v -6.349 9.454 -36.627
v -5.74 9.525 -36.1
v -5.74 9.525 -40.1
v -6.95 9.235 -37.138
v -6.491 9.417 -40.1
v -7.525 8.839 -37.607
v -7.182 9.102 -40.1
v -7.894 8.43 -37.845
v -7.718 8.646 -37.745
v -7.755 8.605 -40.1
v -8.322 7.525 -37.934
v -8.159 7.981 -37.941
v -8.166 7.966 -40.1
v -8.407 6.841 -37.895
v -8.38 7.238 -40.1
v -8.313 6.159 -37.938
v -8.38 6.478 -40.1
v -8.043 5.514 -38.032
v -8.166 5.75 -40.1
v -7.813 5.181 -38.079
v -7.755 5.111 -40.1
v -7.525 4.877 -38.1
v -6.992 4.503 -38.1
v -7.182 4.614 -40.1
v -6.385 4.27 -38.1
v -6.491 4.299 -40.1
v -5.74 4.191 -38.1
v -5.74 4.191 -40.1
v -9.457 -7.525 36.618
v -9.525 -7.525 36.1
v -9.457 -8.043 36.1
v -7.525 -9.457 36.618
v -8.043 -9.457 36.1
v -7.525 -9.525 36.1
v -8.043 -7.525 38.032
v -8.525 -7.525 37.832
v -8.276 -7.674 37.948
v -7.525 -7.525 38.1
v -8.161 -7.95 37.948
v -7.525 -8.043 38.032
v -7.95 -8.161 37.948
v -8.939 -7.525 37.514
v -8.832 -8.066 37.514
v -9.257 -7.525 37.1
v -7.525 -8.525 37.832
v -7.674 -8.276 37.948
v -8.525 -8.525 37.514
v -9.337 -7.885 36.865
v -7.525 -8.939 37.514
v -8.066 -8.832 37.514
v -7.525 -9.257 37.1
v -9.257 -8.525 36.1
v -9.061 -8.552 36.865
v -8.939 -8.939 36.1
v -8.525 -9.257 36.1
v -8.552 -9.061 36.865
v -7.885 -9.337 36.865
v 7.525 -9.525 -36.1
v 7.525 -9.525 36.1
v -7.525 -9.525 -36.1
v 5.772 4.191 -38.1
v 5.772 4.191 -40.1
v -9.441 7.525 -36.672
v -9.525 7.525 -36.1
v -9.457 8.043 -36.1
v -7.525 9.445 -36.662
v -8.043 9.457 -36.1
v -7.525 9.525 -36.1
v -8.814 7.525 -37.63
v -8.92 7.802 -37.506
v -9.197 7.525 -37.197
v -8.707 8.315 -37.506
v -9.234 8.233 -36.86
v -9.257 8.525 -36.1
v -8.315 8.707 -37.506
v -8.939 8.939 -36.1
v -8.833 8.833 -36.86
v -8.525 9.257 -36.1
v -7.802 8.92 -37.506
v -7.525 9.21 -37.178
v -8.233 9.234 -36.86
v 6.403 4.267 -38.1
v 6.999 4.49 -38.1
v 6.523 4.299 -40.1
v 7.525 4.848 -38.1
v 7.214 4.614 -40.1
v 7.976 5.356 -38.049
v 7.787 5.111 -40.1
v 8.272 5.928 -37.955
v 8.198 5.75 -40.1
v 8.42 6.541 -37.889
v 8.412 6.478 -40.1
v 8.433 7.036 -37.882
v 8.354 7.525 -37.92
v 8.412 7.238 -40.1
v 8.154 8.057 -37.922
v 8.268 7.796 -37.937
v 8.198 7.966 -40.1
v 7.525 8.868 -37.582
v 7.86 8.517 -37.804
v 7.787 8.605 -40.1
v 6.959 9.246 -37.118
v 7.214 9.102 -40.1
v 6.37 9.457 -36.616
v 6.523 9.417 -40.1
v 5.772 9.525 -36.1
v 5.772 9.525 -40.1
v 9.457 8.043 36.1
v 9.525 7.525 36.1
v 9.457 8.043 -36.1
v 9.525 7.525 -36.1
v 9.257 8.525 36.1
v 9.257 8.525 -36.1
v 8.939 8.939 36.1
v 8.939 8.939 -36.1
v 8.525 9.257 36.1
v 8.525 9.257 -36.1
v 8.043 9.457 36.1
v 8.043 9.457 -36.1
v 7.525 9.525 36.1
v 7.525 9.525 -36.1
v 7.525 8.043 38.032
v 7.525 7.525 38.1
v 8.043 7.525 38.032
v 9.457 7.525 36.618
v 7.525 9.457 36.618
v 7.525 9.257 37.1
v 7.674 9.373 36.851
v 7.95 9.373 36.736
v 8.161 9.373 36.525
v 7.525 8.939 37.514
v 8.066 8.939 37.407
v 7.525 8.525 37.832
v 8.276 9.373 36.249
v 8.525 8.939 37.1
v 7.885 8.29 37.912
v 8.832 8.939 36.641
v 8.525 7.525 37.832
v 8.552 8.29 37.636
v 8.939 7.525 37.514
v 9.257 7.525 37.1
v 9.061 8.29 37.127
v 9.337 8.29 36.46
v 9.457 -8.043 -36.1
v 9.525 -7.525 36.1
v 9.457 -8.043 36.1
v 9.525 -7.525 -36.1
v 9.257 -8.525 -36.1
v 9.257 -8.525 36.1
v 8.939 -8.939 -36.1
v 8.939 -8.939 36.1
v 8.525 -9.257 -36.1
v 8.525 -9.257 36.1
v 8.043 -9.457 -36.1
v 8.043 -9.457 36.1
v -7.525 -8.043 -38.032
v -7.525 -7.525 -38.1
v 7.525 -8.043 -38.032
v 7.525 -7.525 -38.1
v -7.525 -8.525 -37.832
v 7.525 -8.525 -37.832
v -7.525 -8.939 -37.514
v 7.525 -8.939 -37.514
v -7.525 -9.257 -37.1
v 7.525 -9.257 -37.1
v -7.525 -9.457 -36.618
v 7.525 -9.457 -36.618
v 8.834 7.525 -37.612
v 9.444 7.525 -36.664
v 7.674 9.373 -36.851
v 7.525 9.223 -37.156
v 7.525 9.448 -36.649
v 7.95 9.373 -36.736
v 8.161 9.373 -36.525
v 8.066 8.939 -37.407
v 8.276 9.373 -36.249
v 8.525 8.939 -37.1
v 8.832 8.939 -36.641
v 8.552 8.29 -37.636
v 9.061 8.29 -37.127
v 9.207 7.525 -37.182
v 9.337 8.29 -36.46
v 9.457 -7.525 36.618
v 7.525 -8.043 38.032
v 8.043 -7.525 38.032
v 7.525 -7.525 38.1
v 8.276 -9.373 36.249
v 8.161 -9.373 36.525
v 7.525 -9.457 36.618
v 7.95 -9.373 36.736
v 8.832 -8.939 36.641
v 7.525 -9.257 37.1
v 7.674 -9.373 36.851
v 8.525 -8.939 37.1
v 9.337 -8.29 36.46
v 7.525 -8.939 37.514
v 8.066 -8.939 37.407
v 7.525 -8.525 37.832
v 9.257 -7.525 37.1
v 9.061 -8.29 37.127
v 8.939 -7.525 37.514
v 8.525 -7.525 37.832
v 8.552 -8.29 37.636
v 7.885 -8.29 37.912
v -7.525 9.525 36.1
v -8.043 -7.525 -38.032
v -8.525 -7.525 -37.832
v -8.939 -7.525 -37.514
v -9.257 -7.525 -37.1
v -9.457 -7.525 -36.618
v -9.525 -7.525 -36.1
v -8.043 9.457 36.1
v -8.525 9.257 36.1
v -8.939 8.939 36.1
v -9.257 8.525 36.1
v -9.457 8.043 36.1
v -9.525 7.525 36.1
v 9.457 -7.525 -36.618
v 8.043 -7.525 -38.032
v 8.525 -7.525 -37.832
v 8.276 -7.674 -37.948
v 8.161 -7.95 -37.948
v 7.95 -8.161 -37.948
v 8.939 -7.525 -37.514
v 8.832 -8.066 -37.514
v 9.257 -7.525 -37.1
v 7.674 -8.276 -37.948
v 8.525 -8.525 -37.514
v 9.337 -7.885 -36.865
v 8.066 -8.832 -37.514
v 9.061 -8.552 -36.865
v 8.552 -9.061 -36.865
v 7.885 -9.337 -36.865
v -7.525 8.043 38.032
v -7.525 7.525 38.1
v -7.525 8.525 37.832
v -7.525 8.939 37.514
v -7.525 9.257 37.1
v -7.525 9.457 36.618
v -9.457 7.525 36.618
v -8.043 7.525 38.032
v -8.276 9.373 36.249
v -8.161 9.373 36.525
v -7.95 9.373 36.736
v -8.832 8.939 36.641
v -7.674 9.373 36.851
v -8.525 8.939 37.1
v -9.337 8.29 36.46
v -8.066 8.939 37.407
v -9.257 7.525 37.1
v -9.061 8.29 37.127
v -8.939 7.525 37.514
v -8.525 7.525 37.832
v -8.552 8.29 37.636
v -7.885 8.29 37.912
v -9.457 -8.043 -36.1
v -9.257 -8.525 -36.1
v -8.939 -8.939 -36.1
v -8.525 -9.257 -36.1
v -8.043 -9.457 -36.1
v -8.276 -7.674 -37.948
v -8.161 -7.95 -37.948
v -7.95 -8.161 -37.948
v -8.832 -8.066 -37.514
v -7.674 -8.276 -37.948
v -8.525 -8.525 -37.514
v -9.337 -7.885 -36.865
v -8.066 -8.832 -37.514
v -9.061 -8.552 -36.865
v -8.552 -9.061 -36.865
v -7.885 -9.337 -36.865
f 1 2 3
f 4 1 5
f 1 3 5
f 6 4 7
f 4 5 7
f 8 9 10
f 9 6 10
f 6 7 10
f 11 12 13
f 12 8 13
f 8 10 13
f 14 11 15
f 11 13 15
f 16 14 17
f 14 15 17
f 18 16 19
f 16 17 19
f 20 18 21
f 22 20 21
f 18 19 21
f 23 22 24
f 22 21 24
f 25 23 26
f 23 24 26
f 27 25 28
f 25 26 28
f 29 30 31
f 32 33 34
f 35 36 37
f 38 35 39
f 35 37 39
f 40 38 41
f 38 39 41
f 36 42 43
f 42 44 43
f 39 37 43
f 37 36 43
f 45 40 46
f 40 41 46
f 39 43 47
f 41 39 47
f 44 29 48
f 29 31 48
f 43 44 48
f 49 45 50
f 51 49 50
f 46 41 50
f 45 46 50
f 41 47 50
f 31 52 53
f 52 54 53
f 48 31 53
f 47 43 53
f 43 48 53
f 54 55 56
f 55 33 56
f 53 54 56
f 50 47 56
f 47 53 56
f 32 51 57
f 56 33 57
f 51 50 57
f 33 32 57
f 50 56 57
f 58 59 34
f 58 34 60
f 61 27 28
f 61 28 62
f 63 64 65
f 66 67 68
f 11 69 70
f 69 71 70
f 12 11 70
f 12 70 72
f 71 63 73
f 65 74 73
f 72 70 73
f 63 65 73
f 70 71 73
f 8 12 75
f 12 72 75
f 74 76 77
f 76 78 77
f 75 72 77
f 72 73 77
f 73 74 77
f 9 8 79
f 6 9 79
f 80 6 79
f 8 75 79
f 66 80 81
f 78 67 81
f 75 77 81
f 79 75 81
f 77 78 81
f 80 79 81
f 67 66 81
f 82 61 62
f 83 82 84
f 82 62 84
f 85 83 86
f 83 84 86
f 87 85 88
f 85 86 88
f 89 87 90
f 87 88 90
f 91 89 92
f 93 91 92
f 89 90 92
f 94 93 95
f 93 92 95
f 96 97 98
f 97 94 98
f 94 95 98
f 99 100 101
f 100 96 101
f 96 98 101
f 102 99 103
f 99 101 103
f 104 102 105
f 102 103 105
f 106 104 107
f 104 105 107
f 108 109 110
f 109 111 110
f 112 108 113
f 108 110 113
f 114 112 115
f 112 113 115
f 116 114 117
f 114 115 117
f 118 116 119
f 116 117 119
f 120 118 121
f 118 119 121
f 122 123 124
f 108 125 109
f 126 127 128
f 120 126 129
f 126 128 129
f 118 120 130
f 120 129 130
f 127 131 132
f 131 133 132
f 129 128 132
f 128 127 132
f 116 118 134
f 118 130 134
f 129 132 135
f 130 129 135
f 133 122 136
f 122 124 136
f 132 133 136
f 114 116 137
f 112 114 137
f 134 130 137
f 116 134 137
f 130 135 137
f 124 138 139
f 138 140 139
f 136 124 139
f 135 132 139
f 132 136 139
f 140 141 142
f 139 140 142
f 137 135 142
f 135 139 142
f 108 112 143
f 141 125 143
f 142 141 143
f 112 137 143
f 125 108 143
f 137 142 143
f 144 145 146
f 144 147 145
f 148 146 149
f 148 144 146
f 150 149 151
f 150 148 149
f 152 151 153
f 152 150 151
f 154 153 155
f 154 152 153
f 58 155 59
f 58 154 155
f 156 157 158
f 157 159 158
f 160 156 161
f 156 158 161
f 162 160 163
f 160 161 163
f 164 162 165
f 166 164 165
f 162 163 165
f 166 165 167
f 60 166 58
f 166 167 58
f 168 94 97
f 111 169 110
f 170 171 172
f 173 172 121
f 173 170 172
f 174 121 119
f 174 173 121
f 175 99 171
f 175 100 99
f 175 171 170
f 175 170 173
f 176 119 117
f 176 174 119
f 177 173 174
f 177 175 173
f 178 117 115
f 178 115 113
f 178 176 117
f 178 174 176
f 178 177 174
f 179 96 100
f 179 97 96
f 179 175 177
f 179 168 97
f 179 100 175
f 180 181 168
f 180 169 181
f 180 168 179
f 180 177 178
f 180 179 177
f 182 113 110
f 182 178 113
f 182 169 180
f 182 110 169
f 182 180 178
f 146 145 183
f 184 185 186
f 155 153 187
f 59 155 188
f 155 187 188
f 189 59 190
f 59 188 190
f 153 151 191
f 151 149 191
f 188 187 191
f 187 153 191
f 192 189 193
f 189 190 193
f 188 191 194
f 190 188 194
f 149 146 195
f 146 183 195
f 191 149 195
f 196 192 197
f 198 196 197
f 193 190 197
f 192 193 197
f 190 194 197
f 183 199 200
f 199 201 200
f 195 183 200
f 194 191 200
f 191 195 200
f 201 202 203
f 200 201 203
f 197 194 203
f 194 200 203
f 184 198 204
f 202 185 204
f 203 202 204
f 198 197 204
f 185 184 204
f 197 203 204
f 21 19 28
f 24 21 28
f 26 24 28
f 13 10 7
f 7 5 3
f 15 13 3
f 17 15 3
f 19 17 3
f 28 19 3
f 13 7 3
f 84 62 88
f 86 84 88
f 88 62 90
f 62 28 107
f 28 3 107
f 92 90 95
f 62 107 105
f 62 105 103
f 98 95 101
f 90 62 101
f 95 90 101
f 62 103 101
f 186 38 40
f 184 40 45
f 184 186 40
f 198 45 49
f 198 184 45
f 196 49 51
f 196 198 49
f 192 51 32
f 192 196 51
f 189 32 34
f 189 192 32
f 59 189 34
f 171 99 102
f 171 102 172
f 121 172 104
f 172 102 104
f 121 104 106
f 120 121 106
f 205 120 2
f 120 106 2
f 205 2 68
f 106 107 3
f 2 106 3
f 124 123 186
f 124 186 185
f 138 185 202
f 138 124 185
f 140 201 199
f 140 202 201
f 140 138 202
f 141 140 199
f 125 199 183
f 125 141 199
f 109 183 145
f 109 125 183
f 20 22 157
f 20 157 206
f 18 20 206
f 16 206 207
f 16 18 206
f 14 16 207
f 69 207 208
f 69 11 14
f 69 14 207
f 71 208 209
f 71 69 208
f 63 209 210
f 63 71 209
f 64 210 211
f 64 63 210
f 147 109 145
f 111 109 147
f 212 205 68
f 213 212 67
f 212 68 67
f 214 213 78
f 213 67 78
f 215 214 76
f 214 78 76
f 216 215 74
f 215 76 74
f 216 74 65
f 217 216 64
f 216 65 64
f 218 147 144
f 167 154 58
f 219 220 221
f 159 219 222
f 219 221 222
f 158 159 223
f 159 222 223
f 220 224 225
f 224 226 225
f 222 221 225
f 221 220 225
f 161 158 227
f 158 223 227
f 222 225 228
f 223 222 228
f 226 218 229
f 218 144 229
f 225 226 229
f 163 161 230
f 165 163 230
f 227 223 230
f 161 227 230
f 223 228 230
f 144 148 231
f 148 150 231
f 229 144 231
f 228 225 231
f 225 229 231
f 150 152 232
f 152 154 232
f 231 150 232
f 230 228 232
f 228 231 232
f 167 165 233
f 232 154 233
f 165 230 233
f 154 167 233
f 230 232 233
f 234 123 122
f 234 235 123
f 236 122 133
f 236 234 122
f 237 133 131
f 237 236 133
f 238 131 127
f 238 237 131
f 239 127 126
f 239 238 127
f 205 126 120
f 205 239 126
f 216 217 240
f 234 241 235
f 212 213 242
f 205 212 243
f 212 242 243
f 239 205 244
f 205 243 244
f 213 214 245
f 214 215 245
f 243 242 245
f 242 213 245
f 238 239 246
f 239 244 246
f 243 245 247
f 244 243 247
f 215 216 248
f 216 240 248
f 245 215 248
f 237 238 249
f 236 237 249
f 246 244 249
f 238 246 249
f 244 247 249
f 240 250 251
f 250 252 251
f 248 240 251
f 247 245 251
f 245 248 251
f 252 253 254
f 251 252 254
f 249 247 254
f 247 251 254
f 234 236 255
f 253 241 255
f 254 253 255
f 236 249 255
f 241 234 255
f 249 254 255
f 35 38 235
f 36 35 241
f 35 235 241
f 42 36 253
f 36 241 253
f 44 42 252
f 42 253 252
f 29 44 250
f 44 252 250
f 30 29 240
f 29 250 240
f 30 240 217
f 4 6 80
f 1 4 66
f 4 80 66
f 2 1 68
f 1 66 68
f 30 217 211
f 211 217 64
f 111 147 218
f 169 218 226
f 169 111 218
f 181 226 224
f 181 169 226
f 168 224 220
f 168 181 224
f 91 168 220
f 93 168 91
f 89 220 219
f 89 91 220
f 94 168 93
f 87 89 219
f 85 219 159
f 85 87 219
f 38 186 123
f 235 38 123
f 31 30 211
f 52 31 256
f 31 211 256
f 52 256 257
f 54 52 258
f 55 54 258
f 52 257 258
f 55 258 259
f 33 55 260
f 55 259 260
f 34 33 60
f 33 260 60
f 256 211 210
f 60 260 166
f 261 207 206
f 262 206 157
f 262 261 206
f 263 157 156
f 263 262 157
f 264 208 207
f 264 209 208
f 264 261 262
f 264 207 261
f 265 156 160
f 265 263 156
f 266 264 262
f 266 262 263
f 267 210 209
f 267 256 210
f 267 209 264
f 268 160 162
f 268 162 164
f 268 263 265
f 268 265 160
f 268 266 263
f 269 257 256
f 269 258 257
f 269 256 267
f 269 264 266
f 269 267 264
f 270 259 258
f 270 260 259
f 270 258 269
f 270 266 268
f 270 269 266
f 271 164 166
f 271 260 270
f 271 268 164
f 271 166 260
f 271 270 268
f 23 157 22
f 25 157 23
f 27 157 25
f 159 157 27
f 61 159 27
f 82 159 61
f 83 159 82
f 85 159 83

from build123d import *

# Parameters (mm, degrees)
SKETCH1_W                       = 76.2
SKETCH1_H                       = 19.05
BOSS_EXTRUDE1_DEPTH             = 9.525
FILLET1_R                       = 2
BOSS_EXTRUDE2_DEPTH             = 2
BOSS_EXTRUDE2_DIRECTION_2_REACH = 79.381


with BuildPart() as part:
    # Sketch1 → Boss-Extrude1 (new, symmetric)
    with BuildSketch(Plane(origin=(0, 0, 0), x_dir=(0, 0, -1), z_dir=(1, 0, 0))):
        Rectangle(SKETCH1_W, SKETCH1_H)
    extrude(amount=BOSS_EXTRUDE1_DEPTH, both=True)

    # Fillet1
    fillet1_edges = [part.edges().sort_by_distance(p)[0] for p in [
        (9.525, 0, 38.1),
        (9.525, -9.525, 0),
        (9.525, 0, -38.1),
        (-9.525, -9.525, 0),
        (-9.525, 0, 38.1),
        (-9.525, 9.525, 0),
        (-9.525, 0, -38.1),
        (0, -9.525, -38.1),
        (0, -9.525, 38.1),
        (0, 9.525, 38.1),
        (0, 9.525, -38.1),
        (9.525, 9.525, 0),
    ]]
    fillet(fillet1_edges, radius=FILLET1_R)

    # Sketch2 → Boss-Extrude2 (add)
    with BuildSketch(Plane(origin=(0, 0, -38.1), x_dir=(-1, 0, 0), z_dir=(0, 0, -1))):
        with BuildLine():
            Line((-5.771898524, 9.525), (5.739747172, 9.525))
            ThreePointArc((5.739747172, 9.525), (8.406747172, 6.858), (5.739747172, 4.191))
            Line((5.739747172, 4.191), (-5.771898524, 4.191))
            ThreePointArc((-5.771898524, 4.191), (-8.438898524, 6.858), (-5.771898524, 9.525))
        make_face()
    extrude(amount=BOSS_EXTRUDE2_DEPTH)

    # Sketch2 → Boss-Extrude2 direction 2 (add, up to next)
    with BuildSketch(Plane(origin=(0, 0, -38.1), x_dir=(-1, 0, 0), z_dir=(0, 0, -1)), mode=Mode.PRIVATE) as boss_extrude2_direction_2_sk1:
        with BuildLine():
            Line((-5.771898524, 9.525), (5.739747172, 9.525))
            ThreePointArc((5.739747172, 9.525), (8.406747172, 6.858), (5.739747172, 4.191))
            Line((5.739747172, 4.191), (-5.771898524, 4.191))
            ThreePointArc((-5.771898524, 4.191), (-8.438898524, 6.858), (-5.771898524, 9.525))
        make_face()
    boss_extrude2_direction_2_tool1 = extrude(boss_extrude2_direction_2_sk1.sketch, amount=-BOSS_EXTRUDE2_DIRECTION_2_REACH, mode=Mode.PRIVATE) - part.part
    add(boss_extrude2_direction_2_tool1.solids().sort_by_distance((0.016076, 6.858, -38.1))[0])


solid = part.part
